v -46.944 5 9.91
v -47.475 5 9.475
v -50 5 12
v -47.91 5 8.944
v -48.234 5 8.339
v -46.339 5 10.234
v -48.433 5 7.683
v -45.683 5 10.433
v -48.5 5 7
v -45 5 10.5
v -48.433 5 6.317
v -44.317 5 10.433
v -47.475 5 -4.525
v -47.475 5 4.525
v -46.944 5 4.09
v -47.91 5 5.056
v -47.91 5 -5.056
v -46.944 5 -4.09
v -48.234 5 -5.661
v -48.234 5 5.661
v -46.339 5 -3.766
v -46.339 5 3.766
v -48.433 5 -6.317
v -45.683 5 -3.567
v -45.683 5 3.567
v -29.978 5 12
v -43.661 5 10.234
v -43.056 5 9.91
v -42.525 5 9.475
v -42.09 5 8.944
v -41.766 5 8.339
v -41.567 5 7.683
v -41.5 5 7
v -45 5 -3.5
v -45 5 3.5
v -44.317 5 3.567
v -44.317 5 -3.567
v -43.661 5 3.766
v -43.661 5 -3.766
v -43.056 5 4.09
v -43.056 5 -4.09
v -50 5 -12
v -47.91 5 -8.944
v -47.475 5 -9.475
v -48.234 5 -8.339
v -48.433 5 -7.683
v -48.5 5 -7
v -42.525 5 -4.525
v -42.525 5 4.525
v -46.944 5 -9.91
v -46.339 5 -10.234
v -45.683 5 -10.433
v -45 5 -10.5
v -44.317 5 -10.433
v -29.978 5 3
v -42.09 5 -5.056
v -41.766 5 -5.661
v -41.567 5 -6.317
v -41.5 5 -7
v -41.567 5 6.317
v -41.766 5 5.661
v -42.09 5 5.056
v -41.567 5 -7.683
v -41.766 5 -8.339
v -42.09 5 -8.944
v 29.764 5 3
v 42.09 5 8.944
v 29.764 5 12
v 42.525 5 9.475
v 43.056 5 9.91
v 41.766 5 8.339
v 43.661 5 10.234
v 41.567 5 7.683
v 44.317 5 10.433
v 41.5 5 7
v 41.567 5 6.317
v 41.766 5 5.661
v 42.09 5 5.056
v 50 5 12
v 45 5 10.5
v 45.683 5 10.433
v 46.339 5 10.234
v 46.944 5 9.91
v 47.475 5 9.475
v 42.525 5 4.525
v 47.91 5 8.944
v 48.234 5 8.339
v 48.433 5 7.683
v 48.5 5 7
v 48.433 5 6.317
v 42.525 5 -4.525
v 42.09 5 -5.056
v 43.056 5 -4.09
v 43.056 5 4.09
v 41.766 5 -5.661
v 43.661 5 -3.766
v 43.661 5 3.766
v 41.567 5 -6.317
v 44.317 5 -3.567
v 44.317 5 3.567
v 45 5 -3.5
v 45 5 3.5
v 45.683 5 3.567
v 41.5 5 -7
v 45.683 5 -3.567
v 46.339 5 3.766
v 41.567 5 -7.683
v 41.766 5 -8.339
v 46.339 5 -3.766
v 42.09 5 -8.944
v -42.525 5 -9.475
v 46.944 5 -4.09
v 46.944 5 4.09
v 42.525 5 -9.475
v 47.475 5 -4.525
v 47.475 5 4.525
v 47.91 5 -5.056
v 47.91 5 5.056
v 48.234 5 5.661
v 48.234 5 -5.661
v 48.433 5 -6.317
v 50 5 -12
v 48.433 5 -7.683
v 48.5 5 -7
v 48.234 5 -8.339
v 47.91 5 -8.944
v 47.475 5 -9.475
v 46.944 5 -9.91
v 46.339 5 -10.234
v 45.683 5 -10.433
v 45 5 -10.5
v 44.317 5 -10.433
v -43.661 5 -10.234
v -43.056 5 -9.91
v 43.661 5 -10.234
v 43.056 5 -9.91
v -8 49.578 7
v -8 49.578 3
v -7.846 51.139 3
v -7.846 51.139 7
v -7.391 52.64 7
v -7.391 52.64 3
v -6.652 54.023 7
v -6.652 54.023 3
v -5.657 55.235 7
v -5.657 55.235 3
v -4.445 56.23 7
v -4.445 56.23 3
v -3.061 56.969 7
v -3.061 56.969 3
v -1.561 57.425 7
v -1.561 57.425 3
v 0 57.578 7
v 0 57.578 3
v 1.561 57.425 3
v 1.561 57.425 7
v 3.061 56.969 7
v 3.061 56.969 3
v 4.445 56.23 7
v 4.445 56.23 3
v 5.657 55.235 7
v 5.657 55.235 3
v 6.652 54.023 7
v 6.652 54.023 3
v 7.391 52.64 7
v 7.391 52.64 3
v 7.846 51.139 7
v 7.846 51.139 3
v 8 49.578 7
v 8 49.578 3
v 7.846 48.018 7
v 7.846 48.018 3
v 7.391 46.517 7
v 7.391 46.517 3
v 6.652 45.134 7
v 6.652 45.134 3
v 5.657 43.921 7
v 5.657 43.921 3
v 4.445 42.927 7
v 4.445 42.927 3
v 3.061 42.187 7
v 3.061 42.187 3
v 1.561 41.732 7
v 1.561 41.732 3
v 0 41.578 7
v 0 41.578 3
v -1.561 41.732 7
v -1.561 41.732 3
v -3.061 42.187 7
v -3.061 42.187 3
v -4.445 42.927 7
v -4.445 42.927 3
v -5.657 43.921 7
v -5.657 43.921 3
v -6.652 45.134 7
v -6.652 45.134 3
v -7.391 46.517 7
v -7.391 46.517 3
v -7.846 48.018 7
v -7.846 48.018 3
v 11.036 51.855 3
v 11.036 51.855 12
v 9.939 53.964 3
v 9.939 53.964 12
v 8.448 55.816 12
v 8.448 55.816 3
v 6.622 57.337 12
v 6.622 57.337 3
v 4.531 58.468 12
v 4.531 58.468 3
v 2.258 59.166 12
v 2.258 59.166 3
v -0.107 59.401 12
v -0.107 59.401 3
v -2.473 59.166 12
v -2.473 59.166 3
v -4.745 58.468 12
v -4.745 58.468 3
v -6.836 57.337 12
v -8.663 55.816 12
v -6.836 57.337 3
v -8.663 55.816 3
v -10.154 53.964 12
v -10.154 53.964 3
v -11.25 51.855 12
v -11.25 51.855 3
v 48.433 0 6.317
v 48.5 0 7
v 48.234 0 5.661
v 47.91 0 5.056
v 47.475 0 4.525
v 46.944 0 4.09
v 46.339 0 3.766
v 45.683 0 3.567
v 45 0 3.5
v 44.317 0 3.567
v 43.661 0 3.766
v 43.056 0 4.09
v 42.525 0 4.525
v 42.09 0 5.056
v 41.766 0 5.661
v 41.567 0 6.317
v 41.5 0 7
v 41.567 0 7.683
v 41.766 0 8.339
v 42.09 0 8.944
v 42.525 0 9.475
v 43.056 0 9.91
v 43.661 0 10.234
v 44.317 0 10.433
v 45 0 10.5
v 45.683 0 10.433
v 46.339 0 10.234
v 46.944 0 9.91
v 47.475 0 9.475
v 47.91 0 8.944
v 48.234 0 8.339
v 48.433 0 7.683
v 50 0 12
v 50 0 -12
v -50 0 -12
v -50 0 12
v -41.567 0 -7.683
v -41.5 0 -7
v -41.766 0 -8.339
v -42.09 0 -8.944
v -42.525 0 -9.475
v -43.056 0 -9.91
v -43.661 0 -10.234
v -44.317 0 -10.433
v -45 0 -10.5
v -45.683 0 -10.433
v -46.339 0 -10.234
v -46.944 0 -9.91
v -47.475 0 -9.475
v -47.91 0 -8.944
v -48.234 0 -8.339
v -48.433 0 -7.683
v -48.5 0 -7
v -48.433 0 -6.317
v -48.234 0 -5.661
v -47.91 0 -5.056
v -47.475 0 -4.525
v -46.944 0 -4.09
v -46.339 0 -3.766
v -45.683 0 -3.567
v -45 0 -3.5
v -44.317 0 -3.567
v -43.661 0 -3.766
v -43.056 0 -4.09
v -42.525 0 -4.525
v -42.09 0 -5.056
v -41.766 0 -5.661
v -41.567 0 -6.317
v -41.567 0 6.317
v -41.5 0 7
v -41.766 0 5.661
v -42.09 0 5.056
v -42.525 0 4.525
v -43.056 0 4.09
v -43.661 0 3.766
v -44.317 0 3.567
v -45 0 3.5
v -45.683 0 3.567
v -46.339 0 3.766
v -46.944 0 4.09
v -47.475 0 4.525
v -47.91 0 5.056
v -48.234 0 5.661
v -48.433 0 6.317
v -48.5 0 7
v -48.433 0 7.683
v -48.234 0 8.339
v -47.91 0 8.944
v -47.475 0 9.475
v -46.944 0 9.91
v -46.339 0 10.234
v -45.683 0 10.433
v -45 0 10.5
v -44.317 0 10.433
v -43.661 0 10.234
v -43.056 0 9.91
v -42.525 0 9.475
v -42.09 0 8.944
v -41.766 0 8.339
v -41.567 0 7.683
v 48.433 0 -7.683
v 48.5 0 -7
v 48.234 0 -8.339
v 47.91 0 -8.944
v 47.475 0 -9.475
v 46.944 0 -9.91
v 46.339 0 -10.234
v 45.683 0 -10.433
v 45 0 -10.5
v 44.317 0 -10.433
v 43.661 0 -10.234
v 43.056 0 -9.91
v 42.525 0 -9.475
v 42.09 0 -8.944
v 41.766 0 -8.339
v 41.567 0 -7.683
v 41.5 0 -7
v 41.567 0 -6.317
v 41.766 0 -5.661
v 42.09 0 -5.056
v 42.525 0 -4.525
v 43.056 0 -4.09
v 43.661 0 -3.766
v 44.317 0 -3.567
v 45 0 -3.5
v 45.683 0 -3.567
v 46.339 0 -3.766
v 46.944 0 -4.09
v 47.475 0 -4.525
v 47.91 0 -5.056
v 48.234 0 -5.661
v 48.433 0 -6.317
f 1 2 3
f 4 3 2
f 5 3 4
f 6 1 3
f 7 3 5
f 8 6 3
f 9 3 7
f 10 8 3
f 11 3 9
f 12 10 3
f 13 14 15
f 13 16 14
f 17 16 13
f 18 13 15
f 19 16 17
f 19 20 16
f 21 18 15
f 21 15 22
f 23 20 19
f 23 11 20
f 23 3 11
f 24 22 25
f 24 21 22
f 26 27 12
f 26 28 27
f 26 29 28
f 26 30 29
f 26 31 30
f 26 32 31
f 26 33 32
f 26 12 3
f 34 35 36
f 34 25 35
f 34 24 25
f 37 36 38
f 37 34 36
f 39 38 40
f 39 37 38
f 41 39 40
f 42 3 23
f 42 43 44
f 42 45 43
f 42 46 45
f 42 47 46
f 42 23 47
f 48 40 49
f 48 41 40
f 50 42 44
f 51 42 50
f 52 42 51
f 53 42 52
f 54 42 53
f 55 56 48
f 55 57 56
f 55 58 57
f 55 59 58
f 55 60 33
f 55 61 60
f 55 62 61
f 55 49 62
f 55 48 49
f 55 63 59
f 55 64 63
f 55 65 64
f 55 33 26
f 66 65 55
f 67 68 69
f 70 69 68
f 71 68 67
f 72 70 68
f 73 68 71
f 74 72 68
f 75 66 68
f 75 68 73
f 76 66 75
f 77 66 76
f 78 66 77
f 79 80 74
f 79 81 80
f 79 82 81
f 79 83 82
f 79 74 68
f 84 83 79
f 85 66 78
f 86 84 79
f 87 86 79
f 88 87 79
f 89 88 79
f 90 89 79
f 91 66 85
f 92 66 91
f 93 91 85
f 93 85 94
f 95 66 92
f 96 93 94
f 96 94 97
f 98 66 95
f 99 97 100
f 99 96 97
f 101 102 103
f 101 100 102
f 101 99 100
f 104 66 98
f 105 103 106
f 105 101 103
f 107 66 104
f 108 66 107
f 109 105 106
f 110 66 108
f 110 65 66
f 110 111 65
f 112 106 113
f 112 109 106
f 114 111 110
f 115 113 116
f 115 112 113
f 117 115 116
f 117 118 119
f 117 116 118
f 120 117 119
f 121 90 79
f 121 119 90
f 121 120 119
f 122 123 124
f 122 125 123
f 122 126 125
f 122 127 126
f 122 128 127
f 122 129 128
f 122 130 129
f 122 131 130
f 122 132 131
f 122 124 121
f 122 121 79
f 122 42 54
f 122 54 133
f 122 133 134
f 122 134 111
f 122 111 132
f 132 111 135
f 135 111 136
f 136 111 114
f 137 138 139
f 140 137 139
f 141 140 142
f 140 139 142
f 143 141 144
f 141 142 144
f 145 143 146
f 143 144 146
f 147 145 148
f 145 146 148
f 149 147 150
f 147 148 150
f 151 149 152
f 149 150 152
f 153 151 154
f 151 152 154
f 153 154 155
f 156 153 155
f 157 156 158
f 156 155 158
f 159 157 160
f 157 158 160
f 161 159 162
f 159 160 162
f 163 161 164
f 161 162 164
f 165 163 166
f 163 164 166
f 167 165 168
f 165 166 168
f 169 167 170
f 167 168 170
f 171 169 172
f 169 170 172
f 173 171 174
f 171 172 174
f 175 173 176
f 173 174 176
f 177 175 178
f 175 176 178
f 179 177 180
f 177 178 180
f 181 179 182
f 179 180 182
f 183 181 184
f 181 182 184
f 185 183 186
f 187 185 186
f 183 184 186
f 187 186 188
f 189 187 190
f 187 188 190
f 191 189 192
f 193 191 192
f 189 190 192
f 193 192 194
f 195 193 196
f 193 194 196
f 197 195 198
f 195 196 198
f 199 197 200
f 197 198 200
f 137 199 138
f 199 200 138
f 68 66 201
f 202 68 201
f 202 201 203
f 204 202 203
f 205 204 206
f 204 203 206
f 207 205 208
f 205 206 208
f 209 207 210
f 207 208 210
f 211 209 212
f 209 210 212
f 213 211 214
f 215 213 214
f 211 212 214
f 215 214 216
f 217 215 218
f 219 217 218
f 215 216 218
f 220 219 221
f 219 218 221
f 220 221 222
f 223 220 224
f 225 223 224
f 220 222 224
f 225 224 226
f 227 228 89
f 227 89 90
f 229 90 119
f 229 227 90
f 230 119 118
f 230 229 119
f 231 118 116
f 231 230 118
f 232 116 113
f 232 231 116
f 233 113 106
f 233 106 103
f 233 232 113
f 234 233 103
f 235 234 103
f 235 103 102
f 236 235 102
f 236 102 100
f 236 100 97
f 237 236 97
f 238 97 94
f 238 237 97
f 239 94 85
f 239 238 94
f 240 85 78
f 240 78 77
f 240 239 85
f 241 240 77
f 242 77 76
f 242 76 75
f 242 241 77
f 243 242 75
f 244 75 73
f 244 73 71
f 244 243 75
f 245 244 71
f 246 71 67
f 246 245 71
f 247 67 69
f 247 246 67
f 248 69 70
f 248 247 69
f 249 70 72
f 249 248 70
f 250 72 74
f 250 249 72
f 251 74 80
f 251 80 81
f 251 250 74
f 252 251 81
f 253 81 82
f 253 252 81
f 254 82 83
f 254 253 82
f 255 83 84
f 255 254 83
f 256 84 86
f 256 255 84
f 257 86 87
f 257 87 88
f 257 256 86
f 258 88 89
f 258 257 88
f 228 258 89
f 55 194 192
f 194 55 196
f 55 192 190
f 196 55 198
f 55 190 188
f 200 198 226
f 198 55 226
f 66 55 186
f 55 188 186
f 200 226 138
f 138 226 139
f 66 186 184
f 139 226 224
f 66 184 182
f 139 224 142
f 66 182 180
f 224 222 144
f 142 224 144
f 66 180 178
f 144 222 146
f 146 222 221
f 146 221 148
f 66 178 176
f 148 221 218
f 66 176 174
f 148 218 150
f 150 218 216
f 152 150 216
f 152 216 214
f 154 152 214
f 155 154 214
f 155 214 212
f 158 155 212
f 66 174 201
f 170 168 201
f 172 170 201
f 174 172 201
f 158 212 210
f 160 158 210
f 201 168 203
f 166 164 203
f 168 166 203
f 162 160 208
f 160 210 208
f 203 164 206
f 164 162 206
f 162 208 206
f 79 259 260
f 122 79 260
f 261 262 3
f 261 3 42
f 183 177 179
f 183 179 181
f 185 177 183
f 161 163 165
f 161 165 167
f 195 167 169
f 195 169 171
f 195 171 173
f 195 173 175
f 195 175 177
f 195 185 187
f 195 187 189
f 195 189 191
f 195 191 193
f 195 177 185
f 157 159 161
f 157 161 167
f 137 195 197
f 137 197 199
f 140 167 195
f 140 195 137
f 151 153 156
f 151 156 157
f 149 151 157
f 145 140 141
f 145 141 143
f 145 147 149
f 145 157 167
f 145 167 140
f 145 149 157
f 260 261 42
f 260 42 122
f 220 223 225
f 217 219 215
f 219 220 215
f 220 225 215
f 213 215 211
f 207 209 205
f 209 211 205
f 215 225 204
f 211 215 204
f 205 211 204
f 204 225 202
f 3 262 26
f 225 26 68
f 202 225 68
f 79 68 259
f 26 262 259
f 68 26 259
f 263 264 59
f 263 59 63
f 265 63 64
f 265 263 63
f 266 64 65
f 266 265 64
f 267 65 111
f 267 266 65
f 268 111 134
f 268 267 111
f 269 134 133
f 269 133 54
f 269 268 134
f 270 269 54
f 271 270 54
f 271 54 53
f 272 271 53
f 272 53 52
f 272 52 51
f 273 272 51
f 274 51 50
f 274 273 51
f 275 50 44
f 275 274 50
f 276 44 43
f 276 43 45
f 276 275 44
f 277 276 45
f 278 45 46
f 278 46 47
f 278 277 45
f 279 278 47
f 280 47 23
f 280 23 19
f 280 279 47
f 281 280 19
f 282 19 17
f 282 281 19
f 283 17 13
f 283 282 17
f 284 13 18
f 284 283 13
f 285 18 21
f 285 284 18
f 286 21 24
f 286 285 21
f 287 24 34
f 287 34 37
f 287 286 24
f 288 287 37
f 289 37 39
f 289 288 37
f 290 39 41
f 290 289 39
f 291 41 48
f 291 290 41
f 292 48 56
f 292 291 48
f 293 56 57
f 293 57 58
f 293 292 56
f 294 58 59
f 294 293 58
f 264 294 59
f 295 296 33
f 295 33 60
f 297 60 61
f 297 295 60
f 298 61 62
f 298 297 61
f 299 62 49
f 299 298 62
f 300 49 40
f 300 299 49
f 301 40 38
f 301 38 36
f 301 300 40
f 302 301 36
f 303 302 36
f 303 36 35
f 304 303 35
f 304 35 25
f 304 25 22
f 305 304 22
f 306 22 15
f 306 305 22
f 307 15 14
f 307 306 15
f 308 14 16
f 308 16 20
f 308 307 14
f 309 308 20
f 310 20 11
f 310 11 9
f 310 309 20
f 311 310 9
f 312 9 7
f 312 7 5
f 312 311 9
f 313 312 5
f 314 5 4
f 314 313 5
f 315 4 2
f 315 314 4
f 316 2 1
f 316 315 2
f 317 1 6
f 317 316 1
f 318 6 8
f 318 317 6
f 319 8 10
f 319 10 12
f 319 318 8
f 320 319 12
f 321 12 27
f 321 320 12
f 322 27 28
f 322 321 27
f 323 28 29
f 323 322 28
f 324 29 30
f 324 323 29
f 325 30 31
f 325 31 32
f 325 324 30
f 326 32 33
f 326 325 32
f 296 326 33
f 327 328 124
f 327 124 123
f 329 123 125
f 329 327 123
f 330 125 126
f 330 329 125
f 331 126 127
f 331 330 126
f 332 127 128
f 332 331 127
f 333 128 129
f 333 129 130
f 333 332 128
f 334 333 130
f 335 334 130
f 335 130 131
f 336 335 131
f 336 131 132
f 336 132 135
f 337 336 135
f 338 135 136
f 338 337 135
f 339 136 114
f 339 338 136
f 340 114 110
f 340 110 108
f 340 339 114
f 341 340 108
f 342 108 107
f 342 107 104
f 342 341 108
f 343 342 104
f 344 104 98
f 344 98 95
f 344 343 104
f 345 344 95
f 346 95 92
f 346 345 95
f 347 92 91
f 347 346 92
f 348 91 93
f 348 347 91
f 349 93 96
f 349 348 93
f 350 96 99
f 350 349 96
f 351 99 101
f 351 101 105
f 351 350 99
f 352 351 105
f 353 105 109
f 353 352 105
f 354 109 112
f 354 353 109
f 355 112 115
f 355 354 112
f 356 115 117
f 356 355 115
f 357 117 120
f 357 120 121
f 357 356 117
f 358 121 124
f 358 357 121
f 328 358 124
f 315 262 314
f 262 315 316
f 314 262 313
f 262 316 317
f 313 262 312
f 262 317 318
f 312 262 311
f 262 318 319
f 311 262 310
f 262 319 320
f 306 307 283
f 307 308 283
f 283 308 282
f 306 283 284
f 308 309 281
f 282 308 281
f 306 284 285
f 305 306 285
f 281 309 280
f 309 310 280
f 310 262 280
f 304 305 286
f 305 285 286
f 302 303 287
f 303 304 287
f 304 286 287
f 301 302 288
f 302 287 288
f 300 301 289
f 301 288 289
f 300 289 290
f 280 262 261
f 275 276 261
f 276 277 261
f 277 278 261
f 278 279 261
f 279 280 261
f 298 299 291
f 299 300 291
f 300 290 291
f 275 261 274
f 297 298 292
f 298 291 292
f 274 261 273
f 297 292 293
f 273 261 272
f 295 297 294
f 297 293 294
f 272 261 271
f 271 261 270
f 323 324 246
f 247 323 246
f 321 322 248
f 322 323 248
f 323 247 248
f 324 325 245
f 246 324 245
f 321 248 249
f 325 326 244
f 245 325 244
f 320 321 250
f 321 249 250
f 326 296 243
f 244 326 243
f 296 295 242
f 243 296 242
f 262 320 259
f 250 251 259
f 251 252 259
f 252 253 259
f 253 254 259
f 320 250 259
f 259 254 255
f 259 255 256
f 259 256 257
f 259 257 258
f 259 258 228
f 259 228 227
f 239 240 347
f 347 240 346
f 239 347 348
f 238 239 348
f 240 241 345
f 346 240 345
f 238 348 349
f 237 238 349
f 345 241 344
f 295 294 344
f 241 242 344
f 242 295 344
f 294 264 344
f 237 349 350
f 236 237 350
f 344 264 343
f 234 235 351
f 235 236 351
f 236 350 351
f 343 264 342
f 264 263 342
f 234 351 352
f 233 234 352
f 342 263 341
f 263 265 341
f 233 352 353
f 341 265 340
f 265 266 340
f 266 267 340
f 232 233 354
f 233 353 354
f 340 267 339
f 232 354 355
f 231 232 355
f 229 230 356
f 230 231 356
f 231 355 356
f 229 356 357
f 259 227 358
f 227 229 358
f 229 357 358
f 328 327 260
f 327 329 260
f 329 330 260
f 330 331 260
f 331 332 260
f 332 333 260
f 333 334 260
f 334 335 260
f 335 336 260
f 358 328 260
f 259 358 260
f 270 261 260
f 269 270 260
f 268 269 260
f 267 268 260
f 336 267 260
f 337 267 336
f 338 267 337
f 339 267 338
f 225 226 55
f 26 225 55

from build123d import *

# Parameters (mm, degrees)
SKETCH1_W           = 100
SKETCH1_H           = 24
SKETCH1_R           = 3.5
BOSS_EXTRUDE1_DEPTH = 5
BOSS_EXTRUDE2_DEPTH = 9
SKETCH3_R           = 8
CUT_EXTRUDE1_DEPTH  = 4


with BuildPart() as part:
    # Sketch1 → Boss-Extrude1 (new body)
    with BuildSketch(Plane(origin=(0, 0, 0), x_dir=(1, 0, 0), z_dir=(0, 1, 0))):
        Rectangle(SKETCH1_W, SKETCH1_H)
        with Locations((-45, 7)):
            Circle(SKETCH1_R, mode=Mode.SUBTRACT)
        with Locations((-45, -7)):
            Circle(SKETCH1_R, mode=Mode.SUBTRACT)
        with Locations((45, 7)):
            Circle(SKETCH1_R, mode=Mode.SUBTRACT)
        with Locations((45, -7)):
            Circle(SKETCH1_R, mode=Mode.SUBTRACT)
    extrude(amount=BOSS_EXTRUDE1_DEPTH)

    # Sketch2 → Boss-Extrude2 (add)
    with BuildSketch(Plane.XY.offset(3)):
        with BuildLine():
            Line((-29.978021695, 5), (29.763516014, 5))
            Line((29.763516014, 5), (11.035619534, 51.854874594))
            ThreePointArc((11.035619534, 51.854874594), (-0.107252841, 59.401067767), (-11.250125215, 51.854874594))
            Line((-11.250125215, 51.854874594), (-29.978021695, 5))
        make_face()
    extrude(amount=BOSS_EXTRUDE2_DEPTH)

    # Sketch3 → Cut-Extrude1 (cut)
    with BuildSketch(Plane(origin=(0, 0, 3), x_dir=(-1, 0, 0), z_dir=(0, 0, -1))):
        with Locations((0, 49.578279074)):
            Circle(SKETCH3_R)
    extrude(amount=-CUT_EXTRUDE1_DEPTH, mode=Mode.SUBTRACT)


solid = part.part
